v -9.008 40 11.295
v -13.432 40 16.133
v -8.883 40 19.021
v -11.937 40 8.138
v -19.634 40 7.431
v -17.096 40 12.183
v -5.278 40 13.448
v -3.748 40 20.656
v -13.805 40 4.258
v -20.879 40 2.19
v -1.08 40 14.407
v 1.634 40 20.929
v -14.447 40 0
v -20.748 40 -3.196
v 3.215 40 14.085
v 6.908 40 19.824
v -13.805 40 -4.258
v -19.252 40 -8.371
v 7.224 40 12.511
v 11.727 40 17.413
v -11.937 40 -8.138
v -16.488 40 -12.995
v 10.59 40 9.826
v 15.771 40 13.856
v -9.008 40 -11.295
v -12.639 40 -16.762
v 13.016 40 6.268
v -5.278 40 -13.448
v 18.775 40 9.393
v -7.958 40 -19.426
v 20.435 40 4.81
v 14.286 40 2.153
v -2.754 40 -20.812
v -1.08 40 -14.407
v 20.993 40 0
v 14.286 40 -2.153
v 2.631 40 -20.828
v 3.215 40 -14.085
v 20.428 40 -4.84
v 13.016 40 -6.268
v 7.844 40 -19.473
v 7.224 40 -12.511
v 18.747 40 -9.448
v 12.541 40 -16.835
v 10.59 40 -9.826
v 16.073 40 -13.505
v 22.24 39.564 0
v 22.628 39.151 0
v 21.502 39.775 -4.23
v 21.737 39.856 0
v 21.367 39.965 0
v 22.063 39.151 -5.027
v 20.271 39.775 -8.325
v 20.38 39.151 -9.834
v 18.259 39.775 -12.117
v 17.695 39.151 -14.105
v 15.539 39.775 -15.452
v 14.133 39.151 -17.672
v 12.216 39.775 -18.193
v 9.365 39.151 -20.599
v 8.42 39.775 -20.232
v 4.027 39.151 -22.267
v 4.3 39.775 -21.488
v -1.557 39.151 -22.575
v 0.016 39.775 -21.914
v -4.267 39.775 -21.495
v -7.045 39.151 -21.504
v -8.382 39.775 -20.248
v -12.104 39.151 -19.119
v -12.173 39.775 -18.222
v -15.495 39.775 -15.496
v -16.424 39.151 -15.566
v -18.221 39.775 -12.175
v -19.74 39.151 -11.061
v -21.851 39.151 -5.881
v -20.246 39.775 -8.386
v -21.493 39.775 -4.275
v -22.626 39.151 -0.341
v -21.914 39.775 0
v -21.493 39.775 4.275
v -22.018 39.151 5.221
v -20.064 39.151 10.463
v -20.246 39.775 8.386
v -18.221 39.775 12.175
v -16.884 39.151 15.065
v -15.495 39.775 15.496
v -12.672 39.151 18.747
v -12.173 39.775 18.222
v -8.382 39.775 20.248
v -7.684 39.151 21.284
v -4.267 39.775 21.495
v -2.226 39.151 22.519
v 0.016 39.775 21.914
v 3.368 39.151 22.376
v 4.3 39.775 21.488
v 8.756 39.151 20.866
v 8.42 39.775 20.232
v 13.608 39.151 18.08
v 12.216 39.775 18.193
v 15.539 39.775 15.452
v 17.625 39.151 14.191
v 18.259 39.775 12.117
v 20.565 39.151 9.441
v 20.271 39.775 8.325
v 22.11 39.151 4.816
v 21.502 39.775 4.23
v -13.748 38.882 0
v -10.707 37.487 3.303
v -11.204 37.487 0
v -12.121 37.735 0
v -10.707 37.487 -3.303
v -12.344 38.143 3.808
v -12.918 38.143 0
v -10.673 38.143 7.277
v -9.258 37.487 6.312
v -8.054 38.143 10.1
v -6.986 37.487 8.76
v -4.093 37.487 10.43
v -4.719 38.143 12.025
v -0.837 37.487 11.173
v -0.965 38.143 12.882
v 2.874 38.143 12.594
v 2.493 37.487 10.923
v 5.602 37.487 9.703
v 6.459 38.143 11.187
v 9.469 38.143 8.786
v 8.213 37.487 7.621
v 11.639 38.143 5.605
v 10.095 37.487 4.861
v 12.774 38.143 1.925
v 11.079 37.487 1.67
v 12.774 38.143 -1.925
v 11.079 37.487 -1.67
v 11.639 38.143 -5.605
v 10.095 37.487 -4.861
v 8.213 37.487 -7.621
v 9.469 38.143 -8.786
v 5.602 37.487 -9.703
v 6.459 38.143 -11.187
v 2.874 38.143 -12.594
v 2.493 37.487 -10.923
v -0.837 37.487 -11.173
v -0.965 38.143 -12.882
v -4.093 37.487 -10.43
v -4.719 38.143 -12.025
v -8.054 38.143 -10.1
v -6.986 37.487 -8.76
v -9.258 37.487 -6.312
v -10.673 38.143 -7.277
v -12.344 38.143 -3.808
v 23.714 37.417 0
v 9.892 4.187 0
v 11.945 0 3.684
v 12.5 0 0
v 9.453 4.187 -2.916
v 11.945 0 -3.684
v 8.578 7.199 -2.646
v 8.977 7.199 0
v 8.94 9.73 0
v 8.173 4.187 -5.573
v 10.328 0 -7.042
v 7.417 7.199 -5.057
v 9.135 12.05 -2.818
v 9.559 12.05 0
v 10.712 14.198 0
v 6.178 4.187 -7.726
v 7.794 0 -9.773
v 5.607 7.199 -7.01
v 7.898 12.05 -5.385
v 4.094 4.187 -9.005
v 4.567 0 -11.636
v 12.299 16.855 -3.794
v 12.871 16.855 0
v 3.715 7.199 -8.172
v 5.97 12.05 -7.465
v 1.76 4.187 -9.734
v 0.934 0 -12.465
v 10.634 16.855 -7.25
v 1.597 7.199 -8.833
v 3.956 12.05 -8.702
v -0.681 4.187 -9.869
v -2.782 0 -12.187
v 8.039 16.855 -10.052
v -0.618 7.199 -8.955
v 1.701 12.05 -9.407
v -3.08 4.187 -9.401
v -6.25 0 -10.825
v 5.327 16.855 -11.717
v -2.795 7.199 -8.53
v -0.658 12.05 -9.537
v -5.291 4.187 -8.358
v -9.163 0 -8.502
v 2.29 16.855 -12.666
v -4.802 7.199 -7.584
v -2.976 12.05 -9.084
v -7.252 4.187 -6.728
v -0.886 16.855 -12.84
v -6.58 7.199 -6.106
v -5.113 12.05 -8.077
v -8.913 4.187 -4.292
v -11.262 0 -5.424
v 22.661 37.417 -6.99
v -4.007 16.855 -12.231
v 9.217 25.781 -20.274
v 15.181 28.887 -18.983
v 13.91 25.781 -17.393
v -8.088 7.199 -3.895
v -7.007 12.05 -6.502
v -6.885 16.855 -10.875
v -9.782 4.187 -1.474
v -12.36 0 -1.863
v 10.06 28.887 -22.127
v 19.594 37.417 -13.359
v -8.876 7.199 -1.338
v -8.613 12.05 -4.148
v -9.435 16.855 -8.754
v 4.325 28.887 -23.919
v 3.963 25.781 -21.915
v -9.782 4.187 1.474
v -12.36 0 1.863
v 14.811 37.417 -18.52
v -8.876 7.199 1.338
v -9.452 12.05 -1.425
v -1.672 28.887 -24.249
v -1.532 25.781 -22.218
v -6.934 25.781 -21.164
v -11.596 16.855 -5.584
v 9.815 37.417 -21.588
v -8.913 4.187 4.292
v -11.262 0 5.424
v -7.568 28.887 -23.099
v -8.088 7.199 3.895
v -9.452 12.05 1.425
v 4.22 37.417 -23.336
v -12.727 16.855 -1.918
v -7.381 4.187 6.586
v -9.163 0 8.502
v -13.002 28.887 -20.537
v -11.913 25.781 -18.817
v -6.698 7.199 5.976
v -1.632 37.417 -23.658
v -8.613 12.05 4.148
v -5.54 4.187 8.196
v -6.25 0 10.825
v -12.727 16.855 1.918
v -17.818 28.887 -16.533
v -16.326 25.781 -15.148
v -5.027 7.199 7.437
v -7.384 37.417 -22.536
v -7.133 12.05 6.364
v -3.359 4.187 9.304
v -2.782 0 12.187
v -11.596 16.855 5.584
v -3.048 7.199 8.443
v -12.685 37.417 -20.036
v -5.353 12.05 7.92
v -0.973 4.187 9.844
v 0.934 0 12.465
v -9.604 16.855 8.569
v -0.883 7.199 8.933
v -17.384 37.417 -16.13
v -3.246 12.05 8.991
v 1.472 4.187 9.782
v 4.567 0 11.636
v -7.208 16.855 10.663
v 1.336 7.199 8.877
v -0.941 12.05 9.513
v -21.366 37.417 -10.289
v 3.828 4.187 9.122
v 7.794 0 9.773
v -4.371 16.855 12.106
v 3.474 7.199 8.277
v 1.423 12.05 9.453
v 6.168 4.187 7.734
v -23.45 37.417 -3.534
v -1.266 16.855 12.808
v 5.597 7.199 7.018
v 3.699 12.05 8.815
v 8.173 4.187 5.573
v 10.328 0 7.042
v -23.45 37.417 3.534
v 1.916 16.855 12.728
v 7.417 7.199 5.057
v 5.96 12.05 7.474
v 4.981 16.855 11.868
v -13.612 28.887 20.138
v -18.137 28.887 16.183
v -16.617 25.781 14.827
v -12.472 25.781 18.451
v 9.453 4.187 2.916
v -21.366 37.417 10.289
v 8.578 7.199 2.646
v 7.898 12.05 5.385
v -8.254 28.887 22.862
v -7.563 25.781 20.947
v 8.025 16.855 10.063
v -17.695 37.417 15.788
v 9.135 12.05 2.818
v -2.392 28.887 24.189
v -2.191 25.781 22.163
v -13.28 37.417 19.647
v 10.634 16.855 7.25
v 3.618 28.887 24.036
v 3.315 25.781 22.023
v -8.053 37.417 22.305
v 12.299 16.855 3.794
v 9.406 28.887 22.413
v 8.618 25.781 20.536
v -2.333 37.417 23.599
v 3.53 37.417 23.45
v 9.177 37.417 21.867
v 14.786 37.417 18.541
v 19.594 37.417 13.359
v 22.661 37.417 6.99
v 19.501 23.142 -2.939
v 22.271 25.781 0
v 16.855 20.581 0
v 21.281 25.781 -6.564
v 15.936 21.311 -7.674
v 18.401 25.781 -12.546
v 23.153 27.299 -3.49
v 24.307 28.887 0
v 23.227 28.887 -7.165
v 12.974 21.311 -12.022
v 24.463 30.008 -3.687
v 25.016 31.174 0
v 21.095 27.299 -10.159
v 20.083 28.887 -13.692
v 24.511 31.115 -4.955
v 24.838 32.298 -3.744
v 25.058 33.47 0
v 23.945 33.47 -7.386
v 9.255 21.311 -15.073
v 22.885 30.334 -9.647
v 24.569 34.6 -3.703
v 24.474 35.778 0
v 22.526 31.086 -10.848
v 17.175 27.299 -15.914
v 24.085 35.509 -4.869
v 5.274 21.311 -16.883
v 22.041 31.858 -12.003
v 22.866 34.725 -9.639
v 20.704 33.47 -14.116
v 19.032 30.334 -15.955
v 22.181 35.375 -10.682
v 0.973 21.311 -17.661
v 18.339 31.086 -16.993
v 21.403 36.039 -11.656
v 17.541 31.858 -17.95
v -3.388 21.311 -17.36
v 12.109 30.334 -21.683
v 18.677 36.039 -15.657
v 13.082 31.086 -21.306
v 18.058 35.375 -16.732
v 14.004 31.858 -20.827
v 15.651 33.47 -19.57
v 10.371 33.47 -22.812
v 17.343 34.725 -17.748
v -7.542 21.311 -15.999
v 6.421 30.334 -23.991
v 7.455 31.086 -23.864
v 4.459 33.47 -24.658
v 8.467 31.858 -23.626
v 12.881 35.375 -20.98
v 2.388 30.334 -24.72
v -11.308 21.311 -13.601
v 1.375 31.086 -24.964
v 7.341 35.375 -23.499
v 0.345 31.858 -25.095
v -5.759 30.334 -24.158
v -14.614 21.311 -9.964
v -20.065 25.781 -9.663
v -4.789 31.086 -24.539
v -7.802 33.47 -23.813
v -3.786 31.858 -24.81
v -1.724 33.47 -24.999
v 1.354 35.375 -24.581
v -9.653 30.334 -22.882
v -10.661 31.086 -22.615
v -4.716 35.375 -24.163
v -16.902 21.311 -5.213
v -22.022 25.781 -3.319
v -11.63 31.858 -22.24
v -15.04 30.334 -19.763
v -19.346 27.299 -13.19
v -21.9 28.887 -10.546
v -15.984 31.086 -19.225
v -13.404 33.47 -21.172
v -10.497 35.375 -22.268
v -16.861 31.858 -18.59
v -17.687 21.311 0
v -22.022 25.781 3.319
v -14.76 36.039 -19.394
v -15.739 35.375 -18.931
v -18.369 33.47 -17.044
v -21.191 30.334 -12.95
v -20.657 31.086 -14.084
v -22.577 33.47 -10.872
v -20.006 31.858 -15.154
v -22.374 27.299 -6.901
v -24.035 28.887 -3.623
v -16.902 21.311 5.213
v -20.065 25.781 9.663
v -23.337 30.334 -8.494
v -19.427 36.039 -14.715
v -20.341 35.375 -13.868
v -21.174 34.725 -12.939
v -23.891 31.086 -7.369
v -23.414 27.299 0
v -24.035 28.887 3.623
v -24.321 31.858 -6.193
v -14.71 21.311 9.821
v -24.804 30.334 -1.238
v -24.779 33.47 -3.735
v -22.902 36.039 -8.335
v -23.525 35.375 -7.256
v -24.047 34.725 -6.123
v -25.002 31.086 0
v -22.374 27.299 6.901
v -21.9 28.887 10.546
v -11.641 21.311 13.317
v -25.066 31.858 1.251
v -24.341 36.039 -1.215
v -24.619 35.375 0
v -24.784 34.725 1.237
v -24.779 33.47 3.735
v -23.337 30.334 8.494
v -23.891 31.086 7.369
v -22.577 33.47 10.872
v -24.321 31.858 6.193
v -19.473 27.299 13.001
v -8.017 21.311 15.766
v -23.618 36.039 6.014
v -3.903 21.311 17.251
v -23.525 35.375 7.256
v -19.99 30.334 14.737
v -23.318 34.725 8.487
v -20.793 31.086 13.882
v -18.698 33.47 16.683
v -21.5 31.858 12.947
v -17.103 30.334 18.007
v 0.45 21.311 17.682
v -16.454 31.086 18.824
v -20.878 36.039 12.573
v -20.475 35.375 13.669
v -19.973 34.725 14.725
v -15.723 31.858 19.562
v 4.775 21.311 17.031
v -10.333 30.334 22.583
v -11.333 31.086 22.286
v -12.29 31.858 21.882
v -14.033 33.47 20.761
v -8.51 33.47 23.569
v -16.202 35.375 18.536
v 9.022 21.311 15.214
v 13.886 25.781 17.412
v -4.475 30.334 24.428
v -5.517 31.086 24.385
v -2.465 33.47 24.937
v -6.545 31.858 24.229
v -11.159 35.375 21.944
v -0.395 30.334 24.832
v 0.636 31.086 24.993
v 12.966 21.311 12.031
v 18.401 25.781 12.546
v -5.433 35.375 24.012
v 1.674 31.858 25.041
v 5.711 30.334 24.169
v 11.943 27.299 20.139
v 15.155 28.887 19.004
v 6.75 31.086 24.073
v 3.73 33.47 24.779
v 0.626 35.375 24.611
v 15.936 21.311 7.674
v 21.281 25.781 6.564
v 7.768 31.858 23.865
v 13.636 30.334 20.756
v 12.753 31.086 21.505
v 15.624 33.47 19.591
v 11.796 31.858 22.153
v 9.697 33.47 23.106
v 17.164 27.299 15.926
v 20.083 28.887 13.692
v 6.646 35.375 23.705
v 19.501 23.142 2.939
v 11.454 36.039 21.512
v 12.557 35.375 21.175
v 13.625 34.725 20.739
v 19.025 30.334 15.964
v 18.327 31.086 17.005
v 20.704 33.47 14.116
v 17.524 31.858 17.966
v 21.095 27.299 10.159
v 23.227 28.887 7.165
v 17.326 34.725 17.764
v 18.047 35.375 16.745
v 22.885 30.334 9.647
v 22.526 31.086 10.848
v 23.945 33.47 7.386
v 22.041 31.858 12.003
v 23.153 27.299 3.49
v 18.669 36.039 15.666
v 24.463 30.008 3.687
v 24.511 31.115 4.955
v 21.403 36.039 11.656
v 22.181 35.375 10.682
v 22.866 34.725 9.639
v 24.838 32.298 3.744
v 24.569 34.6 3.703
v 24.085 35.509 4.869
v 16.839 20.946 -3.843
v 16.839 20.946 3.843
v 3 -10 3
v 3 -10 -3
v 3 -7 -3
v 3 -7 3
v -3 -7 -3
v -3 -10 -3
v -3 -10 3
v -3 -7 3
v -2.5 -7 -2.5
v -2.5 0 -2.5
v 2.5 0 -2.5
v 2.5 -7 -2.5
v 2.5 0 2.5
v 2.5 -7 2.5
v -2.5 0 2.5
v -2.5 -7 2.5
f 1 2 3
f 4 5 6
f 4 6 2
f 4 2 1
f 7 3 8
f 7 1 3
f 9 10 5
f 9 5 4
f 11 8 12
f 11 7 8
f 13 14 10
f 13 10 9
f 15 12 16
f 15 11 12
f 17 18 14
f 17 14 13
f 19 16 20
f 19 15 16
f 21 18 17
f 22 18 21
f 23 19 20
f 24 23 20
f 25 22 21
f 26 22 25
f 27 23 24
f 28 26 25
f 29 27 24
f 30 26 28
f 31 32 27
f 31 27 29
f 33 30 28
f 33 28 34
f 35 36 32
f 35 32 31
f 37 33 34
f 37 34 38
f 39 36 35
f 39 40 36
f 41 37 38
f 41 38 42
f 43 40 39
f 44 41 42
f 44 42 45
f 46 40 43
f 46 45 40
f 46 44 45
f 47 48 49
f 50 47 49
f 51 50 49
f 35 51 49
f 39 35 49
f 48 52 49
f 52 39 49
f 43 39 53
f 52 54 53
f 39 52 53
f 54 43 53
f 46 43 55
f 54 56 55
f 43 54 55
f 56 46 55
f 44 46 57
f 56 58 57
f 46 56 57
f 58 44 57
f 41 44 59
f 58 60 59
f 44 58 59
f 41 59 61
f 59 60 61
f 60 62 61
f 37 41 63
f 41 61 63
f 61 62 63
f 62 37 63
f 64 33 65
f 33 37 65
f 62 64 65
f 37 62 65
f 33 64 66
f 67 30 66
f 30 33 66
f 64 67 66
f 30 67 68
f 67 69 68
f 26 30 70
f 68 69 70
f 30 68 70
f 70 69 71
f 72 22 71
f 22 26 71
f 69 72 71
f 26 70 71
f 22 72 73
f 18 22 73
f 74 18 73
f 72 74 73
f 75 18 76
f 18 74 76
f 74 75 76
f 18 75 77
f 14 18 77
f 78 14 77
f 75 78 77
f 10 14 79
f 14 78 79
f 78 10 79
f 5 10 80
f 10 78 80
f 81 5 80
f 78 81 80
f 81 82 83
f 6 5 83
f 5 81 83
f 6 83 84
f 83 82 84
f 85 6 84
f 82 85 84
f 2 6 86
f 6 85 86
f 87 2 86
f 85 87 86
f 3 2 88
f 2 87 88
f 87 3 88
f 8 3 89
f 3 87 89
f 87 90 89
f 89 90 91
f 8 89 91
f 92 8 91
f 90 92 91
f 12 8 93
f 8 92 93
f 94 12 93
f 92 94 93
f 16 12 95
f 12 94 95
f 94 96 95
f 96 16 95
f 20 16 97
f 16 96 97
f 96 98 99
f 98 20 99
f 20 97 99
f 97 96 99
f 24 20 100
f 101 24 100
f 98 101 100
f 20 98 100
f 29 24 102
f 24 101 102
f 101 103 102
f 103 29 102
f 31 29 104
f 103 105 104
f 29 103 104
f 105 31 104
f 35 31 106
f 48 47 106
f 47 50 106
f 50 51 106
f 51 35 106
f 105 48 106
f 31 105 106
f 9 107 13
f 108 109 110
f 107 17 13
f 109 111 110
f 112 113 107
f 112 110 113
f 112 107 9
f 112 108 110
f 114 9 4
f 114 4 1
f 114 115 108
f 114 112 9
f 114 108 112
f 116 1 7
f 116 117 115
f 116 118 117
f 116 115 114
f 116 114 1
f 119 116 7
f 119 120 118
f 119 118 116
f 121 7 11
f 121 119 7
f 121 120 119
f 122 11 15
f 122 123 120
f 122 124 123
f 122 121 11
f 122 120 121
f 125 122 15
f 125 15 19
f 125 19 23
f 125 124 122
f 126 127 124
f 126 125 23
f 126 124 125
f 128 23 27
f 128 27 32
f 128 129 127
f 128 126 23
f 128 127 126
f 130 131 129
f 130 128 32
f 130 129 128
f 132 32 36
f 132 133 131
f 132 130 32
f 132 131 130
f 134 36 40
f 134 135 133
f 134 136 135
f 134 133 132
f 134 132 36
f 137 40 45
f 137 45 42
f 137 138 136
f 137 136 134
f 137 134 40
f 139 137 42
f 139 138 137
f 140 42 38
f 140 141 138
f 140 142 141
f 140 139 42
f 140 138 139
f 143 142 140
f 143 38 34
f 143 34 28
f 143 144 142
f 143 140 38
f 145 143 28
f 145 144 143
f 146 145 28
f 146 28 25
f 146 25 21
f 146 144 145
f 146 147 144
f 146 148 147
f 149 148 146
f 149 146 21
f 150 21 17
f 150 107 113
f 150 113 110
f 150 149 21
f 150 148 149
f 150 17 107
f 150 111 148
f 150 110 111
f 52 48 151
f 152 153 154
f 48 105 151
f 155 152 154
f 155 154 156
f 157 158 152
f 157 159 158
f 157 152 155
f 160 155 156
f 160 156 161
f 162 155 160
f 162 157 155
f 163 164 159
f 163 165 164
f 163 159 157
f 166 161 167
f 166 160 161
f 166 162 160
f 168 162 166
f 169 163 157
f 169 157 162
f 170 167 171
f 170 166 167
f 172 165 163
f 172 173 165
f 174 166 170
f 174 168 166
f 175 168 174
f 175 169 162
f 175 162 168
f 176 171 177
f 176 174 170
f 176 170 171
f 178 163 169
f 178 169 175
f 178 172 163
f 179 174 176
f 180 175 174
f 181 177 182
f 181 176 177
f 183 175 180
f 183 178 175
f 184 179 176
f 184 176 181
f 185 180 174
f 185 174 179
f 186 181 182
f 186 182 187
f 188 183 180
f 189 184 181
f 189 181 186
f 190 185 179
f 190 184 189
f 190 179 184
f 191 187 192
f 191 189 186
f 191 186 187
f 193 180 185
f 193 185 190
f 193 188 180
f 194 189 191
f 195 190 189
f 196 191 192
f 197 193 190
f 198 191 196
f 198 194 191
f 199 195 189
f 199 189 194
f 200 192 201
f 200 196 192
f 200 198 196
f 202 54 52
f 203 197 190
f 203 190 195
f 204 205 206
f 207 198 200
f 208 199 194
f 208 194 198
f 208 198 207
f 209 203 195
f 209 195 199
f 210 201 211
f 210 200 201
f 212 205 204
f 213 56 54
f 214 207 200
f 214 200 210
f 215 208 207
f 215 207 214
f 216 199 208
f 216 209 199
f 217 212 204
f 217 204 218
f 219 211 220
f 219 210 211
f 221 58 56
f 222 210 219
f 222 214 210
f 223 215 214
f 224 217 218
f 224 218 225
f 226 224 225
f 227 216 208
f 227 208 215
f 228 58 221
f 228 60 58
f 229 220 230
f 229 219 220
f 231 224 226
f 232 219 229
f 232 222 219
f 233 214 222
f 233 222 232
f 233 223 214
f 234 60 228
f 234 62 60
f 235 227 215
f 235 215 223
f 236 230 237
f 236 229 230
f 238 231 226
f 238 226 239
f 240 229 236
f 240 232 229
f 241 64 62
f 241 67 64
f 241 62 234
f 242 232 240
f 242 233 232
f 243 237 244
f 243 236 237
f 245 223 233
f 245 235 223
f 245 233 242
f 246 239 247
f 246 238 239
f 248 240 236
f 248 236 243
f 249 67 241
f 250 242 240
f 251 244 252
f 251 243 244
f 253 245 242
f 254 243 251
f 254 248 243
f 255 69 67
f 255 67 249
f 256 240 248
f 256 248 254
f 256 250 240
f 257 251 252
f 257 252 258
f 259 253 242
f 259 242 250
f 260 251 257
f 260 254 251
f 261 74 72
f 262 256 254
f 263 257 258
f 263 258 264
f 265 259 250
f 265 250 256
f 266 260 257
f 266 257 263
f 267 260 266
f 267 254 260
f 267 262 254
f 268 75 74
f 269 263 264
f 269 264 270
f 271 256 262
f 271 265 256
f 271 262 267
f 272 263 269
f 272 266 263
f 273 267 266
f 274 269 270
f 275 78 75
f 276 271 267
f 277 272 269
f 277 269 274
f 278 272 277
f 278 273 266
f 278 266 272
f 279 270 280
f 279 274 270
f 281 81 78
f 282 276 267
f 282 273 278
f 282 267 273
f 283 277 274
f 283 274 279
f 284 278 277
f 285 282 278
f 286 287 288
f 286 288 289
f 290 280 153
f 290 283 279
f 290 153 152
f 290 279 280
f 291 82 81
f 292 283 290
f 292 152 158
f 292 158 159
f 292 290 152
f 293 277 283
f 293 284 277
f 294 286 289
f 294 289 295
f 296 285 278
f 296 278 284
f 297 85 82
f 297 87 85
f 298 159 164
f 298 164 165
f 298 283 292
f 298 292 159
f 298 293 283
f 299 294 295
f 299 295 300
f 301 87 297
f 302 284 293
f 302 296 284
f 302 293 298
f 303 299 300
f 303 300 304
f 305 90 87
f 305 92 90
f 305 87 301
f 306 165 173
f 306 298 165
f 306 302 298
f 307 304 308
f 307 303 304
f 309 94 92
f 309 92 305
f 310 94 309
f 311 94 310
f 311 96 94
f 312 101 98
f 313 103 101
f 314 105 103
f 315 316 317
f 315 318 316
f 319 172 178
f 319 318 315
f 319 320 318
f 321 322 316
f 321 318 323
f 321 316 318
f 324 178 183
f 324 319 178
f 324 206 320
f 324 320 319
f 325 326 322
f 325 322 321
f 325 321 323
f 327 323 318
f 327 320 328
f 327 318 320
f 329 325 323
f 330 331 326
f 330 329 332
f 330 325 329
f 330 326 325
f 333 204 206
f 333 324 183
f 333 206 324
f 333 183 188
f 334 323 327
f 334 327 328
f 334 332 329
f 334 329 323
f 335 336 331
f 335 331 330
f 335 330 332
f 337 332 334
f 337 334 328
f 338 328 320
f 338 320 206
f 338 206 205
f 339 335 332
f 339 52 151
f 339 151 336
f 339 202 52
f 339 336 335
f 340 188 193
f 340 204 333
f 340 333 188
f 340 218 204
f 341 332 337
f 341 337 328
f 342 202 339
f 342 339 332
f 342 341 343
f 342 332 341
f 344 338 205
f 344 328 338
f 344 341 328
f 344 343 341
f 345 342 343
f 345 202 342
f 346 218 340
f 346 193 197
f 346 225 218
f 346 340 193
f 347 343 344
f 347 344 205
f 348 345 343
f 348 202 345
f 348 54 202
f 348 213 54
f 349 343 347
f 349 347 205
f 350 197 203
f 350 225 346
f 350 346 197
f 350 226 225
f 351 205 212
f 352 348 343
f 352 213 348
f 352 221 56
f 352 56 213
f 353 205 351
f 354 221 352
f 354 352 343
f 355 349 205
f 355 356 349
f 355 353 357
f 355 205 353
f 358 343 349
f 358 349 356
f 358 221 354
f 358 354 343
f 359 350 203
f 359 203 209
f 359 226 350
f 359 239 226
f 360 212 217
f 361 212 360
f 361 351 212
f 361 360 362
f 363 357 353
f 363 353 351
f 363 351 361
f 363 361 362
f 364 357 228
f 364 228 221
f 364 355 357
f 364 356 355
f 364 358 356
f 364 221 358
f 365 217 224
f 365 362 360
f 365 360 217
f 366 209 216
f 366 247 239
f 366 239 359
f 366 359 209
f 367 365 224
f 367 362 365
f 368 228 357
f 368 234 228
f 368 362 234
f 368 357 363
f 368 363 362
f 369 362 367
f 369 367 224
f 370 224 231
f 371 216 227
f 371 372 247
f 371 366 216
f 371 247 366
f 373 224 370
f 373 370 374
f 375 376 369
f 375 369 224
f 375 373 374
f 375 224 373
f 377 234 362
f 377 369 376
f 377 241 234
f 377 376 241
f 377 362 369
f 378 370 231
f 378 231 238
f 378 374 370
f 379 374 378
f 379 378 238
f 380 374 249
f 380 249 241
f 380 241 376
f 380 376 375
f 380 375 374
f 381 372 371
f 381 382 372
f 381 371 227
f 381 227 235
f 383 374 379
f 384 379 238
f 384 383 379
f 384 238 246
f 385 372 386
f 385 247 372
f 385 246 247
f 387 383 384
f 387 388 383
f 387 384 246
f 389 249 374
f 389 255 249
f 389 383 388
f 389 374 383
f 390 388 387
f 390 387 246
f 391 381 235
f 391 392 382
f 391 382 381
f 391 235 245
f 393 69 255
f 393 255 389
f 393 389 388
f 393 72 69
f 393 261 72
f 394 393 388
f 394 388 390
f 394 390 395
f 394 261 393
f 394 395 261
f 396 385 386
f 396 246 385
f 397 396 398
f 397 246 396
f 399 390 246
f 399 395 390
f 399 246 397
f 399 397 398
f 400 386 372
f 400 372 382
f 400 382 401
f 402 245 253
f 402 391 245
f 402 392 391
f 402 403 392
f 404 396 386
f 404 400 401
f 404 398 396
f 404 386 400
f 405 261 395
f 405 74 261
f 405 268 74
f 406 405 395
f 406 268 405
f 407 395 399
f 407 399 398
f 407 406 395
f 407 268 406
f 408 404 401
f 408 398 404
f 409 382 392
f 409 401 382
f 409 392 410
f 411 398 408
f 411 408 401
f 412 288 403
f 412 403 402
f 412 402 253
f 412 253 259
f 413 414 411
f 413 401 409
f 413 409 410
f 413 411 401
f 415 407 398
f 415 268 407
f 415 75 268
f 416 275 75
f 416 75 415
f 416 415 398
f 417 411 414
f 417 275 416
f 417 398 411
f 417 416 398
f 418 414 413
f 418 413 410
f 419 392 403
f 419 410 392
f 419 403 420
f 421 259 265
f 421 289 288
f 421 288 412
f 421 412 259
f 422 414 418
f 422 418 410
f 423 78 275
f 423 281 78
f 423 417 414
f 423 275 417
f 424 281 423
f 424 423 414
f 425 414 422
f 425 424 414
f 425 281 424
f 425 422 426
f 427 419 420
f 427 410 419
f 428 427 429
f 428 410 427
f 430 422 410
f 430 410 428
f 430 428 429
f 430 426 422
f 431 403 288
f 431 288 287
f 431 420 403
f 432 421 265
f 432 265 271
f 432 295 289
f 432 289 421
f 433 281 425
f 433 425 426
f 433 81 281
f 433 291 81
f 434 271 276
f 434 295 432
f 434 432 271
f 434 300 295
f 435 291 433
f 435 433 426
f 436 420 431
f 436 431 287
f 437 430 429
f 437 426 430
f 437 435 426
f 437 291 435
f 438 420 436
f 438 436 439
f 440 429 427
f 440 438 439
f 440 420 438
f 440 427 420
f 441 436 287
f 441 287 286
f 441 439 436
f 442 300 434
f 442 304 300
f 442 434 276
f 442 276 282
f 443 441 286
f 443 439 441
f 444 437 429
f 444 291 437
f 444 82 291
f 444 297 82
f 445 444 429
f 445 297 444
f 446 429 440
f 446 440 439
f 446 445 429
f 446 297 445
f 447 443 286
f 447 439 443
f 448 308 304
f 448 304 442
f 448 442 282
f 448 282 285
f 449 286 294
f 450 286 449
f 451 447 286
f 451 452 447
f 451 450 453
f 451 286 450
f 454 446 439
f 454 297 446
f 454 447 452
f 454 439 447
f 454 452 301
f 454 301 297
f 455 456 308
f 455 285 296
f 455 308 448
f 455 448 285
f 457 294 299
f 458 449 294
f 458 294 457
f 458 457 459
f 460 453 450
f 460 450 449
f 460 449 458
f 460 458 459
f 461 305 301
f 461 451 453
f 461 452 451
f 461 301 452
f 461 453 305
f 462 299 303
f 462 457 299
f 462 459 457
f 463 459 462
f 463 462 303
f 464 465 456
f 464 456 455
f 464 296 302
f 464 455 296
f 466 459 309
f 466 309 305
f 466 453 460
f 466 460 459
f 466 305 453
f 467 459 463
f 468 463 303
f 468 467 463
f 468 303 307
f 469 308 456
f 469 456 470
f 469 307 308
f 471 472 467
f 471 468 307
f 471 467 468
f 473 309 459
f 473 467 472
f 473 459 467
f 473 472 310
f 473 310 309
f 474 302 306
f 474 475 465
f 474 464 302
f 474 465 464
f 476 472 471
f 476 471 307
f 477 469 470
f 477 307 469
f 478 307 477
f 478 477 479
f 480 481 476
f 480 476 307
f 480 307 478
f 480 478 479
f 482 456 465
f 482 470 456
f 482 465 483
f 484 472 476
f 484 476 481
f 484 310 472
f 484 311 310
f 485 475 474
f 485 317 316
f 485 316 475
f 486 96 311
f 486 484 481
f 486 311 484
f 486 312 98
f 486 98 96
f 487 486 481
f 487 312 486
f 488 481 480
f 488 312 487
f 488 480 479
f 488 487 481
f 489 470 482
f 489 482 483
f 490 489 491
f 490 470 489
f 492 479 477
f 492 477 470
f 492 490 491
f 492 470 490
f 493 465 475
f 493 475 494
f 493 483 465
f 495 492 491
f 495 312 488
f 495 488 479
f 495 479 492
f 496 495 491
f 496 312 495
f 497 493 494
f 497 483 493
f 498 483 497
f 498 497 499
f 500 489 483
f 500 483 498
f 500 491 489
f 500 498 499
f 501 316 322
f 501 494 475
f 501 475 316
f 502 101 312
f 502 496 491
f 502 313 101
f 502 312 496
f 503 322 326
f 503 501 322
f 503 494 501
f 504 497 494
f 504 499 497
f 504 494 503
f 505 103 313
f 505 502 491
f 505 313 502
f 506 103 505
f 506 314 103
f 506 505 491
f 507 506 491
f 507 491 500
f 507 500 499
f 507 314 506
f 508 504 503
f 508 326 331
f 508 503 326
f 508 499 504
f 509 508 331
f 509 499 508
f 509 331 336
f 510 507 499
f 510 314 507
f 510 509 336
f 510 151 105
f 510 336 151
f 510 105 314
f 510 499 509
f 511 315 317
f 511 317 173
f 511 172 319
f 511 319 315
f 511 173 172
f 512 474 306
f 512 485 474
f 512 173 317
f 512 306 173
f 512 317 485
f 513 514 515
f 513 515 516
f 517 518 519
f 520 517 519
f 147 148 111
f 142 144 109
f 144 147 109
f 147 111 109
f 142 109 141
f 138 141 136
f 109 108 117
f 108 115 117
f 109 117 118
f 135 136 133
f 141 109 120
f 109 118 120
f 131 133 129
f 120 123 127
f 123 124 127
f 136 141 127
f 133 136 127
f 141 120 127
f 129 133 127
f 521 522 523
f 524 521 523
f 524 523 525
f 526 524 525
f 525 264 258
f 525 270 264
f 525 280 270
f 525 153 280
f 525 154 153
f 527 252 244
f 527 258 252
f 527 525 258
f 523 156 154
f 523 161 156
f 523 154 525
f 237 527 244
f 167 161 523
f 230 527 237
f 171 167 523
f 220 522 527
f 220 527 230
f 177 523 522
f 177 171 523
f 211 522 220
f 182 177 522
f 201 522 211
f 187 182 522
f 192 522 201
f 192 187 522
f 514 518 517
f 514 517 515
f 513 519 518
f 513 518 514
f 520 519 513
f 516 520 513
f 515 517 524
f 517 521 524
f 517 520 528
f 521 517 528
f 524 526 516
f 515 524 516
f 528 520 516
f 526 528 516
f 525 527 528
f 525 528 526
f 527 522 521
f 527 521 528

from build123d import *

# Parameters (mm, degrees)
CONG_2_R           = 2
ESQUISSE3_W        = 5
ESQUISSE3_H        = 5
BOSS_EXTRU_1_DEPTH = 10
ESQUISSE4_W        = 6
ESQUISSE4_H        = 6
BOSS_EXTRU_2_DEPTH = 3


with BuildPart() as part:
    # Esquisse1 → Révolution1 (revolve)
    with BuildSketch(Plane.XY):
        with BuildLine():
            Line((0, 0), (12.5, 0))
            add(Edge.make_bspline(
                [(12.5, 0), (-2.792999131, 19.477640693), (36.048194097, 21.903623333), (22, 40)],
                knots=[0, 0, 0, 0, 1, 1, 1, 1], degree=3))
            Line((22, 40), (0, 40))
            Line((0, 40), (0, 0))
        make_face()
    revolve(axis=Axis((0, 0, 0), (0, 1, 0)))

    # Esquisse2 → Enlèvement de matière-Révolution1 (revolve, cut)
    with BuildSketch(Plane.XY):
        with BuildLine():
            Line((-14.44702814, 40), (0, 40))
            Line((0, 40), (0, 37.486983962))
            Line((0, 37.486983962), (-11.204408598, 37.486983962))
            add(Edge.make_bspline(
                [(-14.44702814, 40), (-13.476590785, 37.876911576), (-11.204408598, 37.486983962)],
                knots=[0, 0, 0, 1, 1, 1], degree=2))
        make_face()
    revolve(axis=Axis((0, -3.04576032, 0), (0, 1, 0)), mode=Mode.SUBTRACT)

    # Congé2
    cong_2_edges = [part.edges().sort_by_distance(p)[0] for p in [
        (-22, 40, 0),
    ]]
    fillet(cong_2_edges, radius=CONG_2_R)

    # Esquisse3 → Boss.-Extru.1 (add)
    with BuildSketch(Plane.XZ):
        Rectangle(ESQUISSE3_W, ESQUISSE3_H)
    extrude(amount=BOSS_EXTRU_1_DEPTH)

    # Esquisse4 → Boss.-Extru.2 (add)
    with BuildSketch(Plane.XZ.offset(10)):
        Rectangle(ESQUISSE4_W, ESQUISSE4_H)
    extrude(amount=-BOSS_EXTRU_2_DEPTH)


solid = part.part
